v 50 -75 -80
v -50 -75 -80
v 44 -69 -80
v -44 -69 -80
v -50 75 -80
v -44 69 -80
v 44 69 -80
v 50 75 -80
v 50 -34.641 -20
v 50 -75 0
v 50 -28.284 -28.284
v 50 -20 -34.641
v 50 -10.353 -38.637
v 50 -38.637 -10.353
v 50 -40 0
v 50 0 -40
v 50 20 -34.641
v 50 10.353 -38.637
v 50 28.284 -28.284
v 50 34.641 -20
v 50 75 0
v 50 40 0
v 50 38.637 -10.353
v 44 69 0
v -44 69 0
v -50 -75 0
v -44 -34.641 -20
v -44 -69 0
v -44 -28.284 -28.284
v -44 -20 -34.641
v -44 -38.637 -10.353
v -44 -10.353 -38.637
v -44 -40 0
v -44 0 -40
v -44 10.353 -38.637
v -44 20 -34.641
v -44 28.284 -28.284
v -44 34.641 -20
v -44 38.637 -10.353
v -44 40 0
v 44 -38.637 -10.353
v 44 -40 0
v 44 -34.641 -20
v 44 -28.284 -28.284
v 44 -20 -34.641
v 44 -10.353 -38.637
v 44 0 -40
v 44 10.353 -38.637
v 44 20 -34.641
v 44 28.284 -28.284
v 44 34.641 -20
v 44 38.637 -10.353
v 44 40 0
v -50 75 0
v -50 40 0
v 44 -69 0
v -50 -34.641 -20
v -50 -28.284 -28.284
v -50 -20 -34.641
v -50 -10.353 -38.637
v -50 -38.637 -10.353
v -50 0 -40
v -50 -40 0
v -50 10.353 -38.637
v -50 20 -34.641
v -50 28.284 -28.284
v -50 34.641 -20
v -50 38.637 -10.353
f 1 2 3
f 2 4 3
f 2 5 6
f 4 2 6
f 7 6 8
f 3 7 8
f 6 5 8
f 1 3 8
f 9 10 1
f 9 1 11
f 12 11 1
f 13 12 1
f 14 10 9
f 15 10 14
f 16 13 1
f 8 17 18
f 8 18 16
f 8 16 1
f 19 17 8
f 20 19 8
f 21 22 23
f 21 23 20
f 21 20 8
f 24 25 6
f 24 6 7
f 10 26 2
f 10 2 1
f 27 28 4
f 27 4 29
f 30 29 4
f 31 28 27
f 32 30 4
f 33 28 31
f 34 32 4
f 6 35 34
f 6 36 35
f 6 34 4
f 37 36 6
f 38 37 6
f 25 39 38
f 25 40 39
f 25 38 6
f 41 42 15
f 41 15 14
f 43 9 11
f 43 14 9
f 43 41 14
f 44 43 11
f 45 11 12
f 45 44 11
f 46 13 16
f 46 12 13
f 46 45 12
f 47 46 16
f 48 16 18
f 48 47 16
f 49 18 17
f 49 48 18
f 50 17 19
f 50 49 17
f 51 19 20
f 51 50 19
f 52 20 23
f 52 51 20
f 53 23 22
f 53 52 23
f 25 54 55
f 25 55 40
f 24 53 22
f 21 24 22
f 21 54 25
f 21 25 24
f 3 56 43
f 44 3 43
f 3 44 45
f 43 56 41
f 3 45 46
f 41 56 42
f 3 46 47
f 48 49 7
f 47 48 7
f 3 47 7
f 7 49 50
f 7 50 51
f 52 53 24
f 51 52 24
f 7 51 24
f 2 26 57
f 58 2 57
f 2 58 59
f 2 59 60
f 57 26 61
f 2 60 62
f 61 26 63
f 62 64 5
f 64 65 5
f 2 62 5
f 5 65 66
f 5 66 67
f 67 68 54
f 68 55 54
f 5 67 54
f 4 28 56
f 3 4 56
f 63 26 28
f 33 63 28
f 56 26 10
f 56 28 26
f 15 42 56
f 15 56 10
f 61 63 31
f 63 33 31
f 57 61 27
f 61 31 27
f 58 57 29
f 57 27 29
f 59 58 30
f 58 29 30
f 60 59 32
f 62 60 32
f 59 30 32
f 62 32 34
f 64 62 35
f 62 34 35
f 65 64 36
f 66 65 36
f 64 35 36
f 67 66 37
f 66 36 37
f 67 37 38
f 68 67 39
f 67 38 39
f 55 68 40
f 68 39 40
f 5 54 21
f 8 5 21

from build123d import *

# Parameters (mm, degrees)
SKETCH1_W               = 100
SKETCH1_H               = 150
SKETCH1_W_2             = 88
SKETCH1_H_2             = 138
BOSS_EXTRUDE1_DEPTH     = 80
SKETCH2_R               = 40
CUT_EXTRUDE1_DEPTH      = 51
CUT_EXTRUDE1_DEPTH_BACK = 51


with BuildPart() as part:
    # Sketch1 → Boss-Extrude1 (new body)
    with BuildSketch(Plane.XY):
        Rectangle(SKETCH1_W, SKETCH1_H)
        Rectangle(SKETCH1_W_2, SKETCH1_H_2, mode=Mode.SUBTRACT)
    extrude(amount=-BOSS_EXTRUDE1_DEPTH)

    # Sketch2 → Cut-Extrude1 (cut, two sides)
    with BuildSketch(Plane(origin=(0, 0, 0), x_dir=(0, 0, -1), z_dir=(1, 0, 0))) as cut_extrude1_sk:
        Circle(SKETCH2_R)
    extrude(amount=CUT_EXTRUDE1_DEPTH, mode=Mode.SUBTRACT)
    extrude(cut_extrude1_sk.sketch, amount=-CUT_EXTRUDE1_DEPTH_BACK, mode=Mode.SUBTRACT)


solid = part.part
